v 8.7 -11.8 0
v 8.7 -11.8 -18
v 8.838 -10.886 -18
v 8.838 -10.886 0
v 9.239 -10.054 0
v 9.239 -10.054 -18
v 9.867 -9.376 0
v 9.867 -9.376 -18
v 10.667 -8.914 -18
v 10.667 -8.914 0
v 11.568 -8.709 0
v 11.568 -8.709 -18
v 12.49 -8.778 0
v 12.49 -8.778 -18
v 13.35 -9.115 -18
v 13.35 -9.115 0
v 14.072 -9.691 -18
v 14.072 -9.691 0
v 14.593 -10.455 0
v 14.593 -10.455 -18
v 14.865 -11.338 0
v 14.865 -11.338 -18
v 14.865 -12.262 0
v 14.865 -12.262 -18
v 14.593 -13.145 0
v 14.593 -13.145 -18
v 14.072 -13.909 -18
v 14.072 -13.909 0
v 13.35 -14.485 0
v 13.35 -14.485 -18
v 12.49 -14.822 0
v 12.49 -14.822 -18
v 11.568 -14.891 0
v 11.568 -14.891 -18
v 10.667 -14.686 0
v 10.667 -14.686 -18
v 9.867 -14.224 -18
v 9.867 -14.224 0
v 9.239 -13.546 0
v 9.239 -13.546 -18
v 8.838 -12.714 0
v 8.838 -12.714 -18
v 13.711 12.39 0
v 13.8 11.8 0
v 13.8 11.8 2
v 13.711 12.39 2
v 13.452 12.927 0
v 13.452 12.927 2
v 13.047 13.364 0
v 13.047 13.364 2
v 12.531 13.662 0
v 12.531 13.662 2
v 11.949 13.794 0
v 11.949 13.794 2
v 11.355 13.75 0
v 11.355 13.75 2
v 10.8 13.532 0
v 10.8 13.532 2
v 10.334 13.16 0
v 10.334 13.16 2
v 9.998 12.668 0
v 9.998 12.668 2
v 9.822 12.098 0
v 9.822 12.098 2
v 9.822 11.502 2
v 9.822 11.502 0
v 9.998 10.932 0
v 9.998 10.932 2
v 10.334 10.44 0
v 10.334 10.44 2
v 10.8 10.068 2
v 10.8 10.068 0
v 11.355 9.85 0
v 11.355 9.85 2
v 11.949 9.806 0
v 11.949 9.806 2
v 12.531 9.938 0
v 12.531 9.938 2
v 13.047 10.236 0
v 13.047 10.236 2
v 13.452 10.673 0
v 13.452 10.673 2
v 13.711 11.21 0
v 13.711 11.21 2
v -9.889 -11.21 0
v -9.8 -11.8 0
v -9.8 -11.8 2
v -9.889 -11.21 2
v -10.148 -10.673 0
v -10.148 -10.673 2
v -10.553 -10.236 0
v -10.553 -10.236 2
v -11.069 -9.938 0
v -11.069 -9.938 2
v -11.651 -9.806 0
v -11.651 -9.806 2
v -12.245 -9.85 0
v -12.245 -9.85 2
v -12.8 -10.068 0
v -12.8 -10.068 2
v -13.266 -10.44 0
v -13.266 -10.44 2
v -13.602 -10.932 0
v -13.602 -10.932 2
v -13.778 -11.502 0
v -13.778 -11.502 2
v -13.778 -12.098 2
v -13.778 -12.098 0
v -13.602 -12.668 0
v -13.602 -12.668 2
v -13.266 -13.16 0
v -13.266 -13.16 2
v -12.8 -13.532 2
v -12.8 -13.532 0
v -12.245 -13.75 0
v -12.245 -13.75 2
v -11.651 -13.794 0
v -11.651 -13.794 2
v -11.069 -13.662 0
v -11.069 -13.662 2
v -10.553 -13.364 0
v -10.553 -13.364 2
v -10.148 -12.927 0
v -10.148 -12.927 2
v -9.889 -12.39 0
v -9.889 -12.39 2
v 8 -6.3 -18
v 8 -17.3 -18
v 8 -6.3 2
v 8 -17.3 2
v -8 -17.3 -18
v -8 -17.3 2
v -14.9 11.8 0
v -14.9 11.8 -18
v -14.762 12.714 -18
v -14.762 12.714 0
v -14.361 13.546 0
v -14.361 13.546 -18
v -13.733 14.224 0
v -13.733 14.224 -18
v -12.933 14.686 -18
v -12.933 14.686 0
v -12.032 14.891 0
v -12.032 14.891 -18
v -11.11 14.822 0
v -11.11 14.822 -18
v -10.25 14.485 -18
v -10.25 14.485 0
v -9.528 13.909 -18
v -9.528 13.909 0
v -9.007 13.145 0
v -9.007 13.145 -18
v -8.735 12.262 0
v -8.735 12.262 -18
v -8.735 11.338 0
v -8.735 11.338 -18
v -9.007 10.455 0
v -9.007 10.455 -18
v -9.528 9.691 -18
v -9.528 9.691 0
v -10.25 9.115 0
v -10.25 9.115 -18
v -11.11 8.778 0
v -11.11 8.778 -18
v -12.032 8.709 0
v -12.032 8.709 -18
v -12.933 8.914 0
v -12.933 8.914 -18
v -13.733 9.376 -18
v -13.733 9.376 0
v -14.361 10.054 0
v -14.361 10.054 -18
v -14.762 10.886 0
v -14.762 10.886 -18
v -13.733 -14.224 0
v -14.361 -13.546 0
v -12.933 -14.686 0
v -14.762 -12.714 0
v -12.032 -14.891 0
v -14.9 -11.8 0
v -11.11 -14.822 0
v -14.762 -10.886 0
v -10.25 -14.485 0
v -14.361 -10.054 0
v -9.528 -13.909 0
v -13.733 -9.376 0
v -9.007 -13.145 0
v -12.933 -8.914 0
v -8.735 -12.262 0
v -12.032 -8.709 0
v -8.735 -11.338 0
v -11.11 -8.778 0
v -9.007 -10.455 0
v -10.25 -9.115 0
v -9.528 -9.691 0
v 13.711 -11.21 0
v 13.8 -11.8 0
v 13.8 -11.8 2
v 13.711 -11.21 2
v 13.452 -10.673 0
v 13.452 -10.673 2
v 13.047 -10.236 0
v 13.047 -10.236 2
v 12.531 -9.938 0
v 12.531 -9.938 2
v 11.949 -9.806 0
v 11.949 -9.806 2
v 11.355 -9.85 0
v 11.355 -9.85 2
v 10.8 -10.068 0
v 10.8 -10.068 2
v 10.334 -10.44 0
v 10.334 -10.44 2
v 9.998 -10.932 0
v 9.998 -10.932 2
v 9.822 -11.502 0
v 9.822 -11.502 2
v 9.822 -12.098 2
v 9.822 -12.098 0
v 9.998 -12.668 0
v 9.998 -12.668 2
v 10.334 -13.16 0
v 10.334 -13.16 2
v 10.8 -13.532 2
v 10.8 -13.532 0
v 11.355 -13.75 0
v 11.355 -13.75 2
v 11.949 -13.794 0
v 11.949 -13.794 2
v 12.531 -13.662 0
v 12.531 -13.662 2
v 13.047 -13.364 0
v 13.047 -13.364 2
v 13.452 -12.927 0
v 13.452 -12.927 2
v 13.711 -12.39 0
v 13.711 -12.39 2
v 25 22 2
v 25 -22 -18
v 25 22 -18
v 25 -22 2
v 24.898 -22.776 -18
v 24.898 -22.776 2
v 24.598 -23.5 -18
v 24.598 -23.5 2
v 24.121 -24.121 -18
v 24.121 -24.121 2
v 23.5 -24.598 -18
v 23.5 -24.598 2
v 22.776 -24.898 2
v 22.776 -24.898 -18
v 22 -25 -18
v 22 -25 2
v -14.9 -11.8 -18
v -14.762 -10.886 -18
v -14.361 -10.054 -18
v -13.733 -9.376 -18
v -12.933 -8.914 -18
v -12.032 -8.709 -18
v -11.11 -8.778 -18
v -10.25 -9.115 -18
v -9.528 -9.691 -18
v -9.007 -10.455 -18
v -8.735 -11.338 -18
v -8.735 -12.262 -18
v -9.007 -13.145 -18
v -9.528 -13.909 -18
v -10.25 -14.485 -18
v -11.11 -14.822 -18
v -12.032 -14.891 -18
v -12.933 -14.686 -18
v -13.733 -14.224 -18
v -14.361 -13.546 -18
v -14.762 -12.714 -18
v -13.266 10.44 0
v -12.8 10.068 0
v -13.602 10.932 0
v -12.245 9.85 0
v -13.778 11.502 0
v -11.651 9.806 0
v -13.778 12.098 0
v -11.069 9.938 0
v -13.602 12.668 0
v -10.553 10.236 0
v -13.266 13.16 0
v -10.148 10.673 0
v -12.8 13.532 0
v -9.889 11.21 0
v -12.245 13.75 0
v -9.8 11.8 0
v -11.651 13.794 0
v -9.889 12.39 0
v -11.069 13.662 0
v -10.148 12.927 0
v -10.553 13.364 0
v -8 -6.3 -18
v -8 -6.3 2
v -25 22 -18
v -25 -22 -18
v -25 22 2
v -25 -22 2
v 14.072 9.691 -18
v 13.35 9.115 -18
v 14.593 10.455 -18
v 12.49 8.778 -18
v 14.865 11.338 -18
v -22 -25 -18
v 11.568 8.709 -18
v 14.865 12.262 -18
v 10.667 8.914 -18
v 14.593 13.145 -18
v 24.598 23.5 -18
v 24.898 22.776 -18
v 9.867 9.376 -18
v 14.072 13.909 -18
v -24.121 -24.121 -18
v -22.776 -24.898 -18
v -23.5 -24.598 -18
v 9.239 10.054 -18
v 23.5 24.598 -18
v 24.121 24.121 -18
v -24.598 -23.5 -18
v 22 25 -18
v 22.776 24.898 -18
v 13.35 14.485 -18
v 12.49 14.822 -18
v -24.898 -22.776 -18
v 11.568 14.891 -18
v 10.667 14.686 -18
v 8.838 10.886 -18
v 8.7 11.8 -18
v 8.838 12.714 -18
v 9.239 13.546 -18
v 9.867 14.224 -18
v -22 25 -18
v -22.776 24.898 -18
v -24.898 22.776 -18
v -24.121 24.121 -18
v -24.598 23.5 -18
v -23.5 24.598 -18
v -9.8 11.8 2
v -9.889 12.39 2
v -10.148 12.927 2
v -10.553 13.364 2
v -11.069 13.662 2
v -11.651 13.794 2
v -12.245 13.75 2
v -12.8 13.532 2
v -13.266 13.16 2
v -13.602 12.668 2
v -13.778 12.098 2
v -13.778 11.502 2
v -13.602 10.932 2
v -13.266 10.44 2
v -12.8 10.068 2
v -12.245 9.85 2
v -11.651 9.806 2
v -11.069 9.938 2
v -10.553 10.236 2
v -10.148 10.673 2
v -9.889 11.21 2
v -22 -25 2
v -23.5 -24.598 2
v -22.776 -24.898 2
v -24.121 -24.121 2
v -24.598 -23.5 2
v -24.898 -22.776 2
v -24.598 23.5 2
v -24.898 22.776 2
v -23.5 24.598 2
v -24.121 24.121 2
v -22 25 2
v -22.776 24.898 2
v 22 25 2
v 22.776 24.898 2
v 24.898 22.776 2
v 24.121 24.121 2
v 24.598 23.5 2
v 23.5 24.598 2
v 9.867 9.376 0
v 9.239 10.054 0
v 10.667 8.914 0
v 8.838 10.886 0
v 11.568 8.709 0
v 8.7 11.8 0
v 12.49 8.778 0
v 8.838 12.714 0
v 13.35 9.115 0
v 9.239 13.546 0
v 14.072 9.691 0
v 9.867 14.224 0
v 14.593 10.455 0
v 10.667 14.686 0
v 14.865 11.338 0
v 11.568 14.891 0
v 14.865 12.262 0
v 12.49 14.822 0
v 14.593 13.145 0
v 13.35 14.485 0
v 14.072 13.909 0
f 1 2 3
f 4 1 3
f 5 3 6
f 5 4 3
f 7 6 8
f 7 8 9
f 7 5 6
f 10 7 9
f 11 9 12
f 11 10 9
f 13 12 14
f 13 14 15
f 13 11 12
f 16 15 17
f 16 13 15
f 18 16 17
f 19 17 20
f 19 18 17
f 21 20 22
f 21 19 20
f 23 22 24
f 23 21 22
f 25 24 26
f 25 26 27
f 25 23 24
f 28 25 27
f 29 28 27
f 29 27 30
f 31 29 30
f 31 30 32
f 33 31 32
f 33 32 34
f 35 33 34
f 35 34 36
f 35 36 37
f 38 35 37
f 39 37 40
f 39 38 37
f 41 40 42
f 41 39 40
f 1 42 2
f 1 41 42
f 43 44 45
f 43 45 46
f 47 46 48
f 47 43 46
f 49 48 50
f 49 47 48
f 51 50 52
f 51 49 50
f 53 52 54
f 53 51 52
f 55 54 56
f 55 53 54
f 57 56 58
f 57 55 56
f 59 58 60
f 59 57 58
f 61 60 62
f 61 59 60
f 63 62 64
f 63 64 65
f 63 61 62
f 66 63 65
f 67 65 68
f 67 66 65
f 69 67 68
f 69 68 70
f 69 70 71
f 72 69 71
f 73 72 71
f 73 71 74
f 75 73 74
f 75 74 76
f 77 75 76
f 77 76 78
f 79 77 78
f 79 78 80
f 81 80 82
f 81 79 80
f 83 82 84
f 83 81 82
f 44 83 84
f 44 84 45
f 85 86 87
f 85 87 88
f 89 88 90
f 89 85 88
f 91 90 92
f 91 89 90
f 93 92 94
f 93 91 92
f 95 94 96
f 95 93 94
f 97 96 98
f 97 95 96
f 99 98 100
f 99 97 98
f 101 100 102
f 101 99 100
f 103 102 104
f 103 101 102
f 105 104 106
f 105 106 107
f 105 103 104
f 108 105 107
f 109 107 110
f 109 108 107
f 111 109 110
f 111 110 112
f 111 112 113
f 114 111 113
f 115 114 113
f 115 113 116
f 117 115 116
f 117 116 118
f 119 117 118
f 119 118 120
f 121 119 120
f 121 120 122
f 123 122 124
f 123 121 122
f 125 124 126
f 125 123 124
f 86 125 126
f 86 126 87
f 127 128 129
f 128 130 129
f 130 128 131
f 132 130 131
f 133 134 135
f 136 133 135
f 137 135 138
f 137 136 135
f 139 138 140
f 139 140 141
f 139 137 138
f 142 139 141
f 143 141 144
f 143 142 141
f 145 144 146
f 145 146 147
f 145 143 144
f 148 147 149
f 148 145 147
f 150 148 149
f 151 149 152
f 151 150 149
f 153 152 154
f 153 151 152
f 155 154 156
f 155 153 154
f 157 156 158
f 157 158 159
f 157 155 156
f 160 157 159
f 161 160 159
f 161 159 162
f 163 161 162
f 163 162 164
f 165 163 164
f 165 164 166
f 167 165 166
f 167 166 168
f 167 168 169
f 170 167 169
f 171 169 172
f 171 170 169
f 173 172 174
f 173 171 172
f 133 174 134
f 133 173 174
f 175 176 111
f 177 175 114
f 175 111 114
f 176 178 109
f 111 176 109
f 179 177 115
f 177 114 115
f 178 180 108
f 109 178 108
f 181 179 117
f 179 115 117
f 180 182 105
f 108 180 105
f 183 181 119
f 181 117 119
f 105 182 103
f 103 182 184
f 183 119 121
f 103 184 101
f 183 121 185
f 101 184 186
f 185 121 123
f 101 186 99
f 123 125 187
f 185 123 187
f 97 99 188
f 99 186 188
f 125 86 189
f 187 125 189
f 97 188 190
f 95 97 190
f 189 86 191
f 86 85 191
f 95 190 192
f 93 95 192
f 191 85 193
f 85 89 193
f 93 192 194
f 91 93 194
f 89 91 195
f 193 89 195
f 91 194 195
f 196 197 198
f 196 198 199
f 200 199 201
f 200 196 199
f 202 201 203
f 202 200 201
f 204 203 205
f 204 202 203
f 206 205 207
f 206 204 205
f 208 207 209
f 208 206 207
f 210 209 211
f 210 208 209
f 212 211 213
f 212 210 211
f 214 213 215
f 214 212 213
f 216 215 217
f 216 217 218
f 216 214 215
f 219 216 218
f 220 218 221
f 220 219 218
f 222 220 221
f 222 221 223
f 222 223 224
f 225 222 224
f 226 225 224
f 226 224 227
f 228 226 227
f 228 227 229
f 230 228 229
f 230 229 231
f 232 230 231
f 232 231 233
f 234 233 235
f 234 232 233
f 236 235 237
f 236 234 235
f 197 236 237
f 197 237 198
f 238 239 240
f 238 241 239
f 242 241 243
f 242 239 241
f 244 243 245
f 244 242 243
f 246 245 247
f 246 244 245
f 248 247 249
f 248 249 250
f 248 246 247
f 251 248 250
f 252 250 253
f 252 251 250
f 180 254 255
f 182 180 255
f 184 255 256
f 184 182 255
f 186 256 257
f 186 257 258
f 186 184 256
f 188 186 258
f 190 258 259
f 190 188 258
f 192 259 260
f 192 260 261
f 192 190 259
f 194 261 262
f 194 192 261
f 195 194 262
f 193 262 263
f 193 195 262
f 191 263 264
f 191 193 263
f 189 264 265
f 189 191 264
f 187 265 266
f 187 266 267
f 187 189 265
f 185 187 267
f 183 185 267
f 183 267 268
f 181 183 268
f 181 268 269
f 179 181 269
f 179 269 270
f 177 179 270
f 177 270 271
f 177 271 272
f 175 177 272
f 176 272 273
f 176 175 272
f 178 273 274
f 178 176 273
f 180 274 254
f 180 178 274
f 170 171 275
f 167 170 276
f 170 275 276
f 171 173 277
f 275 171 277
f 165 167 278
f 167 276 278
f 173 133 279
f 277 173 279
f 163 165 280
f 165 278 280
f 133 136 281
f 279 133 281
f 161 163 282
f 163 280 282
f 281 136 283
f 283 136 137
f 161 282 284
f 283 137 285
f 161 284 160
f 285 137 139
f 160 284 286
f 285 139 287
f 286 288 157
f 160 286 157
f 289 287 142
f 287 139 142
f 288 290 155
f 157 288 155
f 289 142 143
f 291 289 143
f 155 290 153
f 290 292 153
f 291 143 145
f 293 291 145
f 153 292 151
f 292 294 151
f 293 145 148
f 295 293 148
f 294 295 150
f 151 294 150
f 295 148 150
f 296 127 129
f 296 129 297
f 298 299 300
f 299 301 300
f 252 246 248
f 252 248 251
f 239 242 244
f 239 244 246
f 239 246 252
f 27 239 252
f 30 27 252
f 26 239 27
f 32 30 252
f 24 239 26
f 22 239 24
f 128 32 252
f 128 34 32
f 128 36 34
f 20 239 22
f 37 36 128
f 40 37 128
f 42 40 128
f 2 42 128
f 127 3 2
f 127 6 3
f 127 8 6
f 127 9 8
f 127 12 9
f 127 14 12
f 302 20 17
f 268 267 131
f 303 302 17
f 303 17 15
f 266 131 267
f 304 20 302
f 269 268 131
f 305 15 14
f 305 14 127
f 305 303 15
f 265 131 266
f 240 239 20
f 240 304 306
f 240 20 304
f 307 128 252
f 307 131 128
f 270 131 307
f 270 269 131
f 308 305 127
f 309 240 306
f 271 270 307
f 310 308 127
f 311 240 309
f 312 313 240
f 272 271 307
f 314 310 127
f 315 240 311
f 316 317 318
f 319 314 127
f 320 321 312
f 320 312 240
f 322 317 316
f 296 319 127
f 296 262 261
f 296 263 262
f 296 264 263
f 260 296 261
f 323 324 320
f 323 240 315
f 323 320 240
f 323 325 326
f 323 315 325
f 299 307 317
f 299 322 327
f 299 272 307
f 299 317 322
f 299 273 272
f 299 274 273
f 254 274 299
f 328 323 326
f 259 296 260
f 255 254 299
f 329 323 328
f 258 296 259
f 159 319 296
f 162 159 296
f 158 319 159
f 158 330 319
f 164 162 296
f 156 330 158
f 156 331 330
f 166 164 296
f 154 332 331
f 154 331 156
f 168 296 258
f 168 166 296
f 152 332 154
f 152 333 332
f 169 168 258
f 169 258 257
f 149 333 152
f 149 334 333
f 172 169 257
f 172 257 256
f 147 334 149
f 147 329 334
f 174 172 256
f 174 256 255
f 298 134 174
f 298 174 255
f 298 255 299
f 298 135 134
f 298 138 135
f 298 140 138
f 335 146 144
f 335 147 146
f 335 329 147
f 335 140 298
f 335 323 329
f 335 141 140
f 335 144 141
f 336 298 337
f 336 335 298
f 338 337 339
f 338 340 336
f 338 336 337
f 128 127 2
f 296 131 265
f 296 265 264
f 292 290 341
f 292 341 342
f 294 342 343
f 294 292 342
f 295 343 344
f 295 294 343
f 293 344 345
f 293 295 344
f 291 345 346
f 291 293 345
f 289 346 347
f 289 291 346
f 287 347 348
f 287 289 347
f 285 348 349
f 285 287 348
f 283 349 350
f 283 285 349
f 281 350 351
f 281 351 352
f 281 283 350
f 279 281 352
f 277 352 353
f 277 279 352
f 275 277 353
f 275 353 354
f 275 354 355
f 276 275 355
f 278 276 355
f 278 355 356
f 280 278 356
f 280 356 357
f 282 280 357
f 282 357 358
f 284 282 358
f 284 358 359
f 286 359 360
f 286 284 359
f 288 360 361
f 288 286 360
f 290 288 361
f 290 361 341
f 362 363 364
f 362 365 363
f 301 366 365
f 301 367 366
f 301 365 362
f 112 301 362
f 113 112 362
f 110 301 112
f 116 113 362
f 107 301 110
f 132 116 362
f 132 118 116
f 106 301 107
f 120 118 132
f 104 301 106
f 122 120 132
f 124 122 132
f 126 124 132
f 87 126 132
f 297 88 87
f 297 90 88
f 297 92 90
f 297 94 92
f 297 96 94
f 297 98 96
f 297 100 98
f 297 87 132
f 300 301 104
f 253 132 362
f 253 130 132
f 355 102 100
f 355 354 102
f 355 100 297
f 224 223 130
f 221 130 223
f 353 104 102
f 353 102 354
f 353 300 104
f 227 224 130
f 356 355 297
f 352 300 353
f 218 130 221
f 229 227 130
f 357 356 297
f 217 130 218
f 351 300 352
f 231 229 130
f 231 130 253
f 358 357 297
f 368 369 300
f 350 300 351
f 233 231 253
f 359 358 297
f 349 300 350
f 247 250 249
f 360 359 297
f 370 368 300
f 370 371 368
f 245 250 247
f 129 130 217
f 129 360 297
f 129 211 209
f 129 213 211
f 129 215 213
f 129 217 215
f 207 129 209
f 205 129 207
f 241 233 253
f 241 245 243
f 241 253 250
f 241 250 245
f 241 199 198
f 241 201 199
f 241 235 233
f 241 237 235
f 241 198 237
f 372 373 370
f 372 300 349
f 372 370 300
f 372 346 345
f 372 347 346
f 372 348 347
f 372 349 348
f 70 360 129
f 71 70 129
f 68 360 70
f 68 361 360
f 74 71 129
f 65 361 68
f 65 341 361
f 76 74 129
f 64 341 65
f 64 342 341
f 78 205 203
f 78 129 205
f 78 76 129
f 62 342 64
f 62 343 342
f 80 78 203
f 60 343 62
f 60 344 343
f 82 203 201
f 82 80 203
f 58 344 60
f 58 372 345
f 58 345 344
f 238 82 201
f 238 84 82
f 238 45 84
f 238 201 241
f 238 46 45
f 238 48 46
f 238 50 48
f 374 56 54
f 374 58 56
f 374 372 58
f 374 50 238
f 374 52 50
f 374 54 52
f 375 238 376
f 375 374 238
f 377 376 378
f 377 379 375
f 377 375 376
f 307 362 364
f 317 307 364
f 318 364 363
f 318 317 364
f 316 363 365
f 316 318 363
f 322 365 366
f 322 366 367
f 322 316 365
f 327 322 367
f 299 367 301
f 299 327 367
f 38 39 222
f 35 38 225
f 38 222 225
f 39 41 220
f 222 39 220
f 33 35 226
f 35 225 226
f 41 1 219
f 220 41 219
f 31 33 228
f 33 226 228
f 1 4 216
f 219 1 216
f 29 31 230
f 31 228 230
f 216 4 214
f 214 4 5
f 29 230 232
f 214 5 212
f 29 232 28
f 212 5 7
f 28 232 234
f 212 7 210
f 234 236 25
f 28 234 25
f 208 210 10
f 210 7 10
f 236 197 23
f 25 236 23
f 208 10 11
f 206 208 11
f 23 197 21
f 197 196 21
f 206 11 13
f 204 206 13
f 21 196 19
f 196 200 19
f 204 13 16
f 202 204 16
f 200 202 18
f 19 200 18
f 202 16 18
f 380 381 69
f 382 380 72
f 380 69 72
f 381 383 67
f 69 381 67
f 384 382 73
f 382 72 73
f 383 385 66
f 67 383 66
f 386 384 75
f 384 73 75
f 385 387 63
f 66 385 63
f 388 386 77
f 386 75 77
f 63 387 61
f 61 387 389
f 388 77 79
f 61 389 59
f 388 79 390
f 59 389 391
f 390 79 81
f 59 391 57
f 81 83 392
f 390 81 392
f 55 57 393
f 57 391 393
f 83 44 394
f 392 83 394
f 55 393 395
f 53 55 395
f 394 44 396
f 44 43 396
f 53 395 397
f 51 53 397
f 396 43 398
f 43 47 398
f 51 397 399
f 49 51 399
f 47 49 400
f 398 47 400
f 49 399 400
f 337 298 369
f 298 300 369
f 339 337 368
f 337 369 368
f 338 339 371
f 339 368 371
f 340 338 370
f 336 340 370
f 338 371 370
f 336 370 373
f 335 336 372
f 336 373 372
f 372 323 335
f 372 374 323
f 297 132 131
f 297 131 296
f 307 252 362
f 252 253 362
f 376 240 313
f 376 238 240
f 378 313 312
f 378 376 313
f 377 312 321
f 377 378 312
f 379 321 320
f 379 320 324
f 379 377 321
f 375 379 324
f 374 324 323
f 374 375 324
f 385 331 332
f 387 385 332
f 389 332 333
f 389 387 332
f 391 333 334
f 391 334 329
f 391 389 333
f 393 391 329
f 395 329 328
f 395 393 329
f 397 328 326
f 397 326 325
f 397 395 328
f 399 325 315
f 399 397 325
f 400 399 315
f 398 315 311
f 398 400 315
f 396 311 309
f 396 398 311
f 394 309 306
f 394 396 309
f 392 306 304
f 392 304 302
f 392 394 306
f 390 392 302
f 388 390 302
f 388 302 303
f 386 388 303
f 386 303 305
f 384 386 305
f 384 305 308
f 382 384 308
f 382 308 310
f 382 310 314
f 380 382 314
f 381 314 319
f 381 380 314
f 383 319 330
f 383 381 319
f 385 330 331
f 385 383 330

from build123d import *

# Parameters (mm, degrees)
SKETCH1_W           = 50
SKETCH1_H           = 50
SKETCH1_R           = 2
SKETCH1_W_2         = 16
SKETCH1_H_2         = 11
BOSS_EXTRUDE1_DEPTH = 2
SKETCH2_W           = 50
SKETCH2_H           = 50
SKETCH2_R           = 3.1
SKETCH2_W_2         = 16
SKETCH2_H_2         = 11
BOSS_EXTRUDE2_DEPTH = 18
FILLET1_R           = 3


with BuildPart() as part:
    # Sketch1 → Boss-Extrude1 (new body)
    with BuildSketch(Plane.XY):
        Rectangle(SKETCH1_W, SKETCH1_H)
        with Locations((-11.8, 11.8)):
            Circle(SKETCH1_R, mode=Mode.SUBTRACT)
        with Locations((-11.8, -11.8)):
            Circle(SKETCH1_R, mode=Mode.SUBTRACT)
        with Locations((11.8, -11.8)):
            Circle(SKETCH1_R, mode=Mode.SUBTRACT)
        with Locations((11.8, 11.8)):
            Circle(SKETCH1_R, mode=Mode.SUBTRACT)
        with Locations((0, -11.8)):
            Rectangle(SKETCH1_W_2, SKETCH1_H_2, mode=Mode.SUBTRACT)
    extrude(amount=BOSS_EXTRUDE1_DEPTH)

    # Sketch2 → Boss-Extrude2 (add)
    with BuildSketch(Plane(origin=(0, 0, 0), x_dir=(-1, 0, 0), z_dir=(0, 0, -1))):
        Rectangle(SKETCH2_W, SKETCH2_H)
        with Locations((-11.8, -11.8)):
            Circle(SKETCH2_R, mode=Mode.SUBTRACT)
        with Locations((11.8, -11.8)):
            Circle(SKETCH2_R, mode=Mode.SUBTRACT)
        with Locations((11.8, 11.8)):
            Circle(SKETCH2_R, mode=Mode.SUBTRACT)
        with Locations((-11.8, 11.8)):
            Circle(SKETCH2_R, mode=Mode.SUBTRACT)
        with Locations((0, -11.8)):
            Rectangle(SKETCH2_W_2, SKETCH2_H_2, mode=Mode.SUBTRACT)
    extrude(amount=BOSS_EXTRUDE2_DEPTH)

    # Fillet1
    fillet1_edges = [part.edges().sort_by_distance(p)[0] for p in [
        (25, -25, -8),
        (-25, -25, -8),
        (-25, 25, -8),
        (25, 25, -8),
    ]]
    fillet(fillet1_edges, radius=FILLET1_R)


solid = part.part
